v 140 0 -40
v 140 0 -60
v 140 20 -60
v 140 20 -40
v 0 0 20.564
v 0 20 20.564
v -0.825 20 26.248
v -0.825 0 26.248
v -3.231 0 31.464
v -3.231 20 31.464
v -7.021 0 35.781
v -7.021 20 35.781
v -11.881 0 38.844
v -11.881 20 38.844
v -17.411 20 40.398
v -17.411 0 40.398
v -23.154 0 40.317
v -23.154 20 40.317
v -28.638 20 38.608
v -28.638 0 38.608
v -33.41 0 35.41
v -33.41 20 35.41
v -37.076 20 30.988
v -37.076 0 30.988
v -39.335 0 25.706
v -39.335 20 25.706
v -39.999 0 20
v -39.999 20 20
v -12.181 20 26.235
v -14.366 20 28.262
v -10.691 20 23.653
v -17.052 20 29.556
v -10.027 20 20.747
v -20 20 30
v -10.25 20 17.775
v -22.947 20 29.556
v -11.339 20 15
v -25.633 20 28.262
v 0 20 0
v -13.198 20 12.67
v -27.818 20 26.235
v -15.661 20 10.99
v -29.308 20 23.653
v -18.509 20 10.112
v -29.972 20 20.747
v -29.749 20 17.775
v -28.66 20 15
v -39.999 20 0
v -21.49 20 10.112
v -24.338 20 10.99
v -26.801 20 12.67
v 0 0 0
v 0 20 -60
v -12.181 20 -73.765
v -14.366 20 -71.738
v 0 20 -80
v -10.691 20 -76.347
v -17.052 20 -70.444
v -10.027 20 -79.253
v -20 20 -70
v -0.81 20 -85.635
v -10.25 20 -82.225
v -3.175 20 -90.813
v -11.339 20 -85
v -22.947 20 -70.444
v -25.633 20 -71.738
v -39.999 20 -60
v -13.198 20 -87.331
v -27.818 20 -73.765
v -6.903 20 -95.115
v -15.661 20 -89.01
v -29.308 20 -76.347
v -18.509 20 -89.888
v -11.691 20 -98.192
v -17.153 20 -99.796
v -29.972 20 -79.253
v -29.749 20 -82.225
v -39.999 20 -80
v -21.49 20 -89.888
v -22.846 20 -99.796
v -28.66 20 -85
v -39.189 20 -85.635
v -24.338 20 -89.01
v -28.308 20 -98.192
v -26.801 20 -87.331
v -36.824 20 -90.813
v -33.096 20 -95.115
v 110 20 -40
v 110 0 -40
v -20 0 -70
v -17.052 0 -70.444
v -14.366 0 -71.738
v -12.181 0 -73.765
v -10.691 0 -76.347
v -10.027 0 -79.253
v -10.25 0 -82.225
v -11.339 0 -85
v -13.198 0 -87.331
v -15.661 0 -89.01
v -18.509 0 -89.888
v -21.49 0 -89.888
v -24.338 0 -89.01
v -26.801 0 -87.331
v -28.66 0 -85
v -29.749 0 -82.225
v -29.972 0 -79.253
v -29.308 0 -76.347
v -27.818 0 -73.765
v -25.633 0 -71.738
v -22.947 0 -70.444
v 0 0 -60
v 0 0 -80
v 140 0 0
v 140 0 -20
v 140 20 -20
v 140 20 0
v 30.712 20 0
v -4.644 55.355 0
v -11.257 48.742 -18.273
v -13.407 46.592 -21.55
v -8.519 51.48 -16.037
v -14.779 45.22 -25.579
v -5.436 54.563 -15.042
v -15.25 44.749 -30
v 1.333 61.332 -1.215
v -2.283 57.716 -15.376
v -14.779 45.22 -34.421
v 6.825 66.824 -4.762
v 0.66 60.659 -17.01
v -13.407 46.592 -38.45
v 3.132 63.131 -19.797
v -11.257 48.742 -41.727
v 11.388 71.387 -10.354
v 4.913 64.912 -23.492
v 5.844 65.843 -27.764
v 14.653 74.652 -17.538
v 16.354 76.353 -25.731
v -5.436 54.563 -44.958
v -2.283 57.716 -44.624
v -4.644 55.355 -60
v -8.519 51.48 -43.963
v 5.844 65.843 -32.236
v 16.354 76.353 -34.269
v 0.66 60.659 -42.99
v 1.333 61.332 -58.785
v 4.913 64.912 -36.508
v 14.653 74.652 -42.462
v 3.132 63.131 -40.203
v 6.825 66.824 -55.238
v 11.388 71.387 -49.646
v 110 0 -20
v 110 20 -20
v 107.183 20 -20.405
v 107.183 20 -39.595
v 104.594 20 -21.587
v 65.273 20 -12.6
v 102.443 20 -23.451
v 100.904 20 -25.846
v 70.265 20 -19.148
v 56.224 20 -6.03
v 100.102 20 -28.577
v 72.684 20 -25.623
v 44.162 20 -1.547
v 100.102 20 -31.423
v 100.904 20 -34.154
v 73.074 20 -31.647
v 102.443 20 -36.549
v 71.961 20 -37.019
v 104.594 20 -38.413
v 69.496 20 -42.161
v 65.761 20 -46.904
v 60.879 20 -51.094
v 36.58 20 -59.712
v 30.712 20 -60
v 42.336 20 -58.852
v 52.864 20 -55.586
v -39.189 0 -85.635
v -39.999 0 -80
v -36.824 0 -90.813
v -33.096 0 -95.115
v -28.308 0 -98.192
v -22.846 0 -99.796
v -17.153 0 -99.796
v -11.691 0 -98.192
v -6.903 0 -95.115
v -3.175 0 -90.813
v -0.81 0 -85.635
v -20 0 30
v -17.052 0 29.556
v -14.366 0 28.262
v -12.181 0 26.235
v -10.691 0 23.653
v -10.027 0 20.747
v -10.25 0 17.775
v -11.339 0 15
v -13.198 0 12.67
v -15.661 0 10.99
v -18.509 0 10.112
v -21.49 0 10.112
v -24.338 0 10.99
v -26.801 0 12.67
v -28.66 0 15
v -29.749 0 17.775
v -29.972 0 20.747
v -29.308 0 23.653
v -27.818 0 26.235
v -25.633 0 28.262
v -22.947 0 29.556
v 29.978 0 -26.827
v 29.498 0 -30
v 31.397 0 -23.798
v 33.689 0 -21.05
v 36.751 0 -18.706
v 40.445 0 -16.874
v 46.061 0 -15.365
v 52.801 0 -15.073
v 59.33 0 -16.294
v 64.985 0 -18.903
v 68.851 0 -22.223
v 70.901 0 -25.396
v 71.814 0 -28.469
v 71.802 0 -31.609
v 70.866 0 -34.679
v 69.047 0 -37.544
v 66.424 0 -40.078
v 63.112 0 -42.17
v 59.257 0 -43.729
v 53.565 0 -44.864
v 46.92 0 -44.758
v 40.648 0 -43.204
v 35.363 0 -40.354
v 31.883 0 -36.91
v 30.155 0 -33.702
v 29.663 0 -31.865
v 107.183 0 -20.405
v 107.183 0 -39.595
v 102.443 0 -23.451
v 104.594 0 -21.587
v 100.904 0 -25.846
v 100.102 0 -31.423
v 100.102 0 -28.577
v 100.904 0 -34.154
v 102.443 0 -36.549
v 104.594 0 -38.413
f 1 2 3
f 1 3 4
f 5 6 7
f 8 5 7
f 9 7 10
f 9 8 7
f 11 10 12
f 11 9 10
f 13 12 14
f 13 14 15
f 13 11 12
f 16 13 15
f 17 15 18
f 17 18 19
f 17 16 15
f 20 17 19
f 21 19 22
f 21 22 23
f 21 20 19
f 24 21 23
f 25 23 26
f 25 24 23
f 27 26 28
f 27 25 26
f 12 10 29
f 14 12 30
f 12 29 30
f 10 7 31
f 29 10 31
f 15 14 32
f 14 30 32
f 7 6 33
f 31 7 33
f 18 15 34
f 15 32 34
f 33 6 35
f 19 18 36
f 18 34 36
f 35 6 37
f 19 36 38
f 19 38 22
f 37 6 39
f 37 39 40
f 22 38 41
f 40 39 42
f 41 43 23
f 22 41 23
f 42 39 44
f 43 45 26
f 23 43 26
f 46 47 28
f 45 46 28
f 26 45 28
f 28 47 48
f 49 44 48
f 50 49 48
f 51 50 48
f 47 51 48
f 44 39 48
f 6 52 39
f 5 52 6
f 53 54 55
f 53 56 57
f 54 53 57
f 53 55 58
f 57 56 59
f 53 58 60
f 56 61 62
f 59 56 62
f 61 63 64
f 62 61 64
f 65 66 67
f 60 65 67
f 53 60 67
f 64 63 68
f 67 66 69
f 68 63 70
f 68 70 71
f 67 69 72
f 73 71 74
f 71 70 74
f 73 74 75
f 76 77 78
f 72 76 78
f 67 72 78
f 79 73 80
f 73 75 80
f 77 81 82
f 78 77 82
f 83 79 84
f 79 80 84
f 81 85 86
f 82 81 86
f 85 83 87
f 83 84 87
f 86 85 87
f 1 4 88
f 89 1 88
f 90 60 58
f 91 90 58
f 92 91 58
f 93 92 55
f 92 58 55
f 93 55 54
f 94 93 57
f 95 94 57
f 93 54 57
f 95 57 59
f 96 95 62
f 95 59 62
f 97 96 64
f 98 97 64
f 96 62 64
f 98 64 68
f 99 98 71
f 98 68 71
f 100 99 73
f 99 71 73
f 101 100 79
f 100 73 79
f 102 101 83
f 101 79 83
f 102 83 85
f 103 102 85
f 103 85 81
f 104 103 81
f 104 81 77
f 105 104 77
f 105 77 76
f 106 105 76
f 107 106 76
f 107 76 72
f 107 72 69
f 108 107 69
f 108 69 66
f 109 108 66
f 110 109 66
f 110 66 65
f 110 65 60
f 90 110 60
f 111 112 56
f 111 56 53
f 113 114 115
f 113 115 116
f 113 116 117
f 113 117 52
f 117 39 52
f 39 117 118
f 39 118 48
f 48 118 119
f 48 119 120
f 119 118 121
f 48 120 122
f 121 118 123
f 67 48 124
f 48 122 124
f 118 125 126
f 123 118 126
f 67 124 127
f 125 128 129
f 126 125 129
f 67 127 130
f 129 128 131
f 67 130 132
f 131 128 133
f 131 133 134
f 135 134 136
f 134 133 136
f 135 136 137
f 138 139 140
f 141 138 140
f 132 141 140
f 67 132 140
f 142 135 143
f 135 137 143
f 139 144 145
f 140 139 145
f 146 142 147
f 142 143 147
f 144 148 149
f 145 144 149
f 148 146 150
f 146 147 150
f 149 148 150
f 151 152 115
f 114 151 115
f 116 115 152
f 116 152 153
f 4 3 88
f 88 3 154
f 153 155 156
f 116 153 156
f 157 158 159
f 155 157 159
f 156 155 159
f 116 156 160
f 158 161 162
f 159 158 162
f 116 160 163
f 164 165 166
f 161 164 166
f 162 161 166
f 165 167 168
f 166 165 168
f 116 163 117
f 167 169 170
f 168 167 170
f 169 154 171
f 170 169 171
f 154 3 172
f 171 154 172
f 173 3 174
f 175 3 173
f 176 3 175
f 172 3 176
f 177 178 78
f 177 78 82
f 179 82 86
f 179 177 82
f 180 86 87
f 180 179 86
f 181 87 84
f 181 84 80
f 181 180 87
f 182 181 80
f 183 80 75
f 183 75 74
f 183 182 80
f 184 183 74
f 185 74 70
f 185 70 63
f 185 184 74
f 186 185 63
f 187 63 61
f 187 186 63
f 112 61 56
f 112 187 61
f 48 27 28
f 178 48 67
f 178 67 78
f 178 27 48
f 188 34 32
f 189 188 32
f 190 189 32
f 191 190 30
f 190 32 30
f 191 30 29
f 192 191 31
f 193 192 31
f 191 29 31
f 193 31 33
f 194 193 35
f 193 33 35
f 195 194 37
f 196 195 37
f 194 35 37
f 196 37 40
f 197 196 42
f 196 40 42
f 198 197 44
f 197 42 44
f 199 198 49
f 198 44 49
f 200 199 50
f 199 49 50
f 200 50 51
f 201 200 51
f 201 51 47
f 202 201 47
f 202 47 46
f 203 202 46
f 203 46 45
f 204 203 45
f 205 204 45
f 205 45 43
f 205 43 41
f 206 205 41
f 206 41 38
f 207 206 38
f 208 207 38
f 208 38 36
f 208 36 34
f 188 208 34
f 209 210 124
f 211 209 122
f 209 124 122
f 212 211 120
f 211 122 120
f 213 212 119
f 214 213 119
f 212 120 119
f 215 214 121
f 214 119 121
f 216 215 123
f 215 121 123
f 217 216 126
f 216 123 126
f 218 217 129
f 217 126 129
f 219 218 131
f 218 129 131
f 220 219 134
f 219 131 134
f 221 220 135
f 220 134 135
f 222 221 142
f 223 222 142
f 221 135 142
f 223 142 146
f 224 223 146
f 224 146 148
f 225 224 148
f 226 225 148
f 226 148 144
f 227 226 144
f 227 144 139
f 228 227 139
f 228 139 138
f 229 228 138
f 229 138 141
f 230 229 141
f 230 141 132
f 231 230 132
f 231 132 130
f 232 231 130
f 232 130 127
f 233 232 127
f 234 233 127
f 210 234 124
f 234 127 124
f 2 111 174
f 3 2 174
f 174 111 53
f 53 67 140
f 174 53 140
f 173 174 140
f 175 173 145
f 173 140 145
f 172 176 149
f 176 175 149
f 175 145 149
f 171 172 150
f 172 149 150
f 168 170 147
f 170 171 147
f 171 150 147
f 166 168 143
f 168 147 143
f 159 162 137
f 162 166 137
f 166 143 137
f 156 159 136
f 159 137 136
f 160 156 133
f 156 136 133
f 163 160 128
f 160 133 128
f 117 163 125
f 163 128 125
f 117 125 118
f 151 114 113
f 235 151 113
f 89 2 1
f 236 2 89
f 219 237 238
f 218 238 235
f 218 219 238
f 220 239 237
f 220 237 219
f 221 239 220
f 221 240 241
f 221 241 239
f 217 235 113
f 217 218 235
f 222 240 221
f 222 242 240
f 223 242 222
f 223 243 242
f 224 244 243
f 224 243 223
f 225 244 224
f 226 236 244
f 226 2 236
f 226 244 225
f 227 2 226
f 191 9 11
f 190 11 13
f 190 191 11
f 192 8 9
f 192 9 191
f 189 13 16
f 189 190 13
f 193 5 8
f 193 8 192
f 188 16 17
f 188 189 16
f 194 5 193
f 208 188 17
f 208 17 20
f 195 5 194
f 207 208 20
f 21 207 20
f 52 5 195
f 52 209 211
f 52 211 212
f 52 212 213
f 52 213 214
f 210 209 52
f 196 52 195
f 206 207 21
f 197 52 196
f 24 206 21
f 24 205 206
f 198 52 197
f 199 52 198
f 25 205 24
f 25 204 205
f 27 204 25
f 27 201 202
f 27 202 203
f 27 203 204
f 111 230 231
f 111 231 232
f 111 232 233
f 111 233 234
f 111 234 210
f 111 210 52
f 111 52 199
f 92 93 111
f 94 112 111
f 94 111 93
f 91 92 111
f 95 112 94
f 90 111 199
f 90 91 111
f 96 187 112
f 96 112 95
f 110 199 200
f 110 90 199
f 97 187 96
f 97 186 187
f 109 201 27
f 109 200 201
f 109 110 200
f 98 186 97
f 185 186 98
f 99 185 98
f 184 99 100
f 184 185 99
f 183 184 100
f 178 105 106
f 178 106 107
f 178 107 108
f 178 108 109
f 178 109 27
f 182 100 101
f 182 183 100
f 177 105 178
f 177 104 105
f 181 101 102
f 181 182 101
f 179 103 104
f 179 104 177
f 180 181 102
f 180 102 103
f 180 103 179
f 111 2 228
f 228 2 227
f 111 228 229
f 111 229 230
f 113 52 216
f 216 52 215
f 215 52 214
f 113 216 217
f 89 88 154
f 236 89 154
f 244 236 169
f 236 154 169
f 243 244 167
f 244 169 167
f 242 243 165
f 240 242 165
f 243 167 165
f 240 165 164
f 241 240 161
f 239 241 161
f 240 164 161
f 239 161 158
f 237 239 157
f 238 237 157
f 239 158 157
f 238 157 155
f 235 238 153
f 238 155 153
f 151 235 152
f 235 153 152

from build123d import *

# Parameters (mm, degrees)
BOSS_EXTRUDE2_DEPTH = 20
SKETCH2_R           = 10
CUT_EXTRUDE1_DEPTH  = 174.204794268
BOSS_EXTRUDE3_REACH = 201.499
CUT_EXTRUDE3_REACH  = 204.653
SKETCH5_R           = 15
CUT_EXTRUDE4_DEPTH  = 182.107428775


with BuildPart() as part:
    # Sketch1 → Boss-Extrude2 (new body)
    with BuildSketch(Plane(origin=(0, 0, 0), x_dir=(1, 0, 0), z_dir=(0, 1, 0))):
        with BuildLine():
            Line((0, 60), (140, 60))
            Line((140, 60), (140, 0))
            Line((140, 0), (0, 0))
            Line((0, 0), (0, -20.563630546))
            ThreePointArc((0, -20.563630546), (-20.285292958, -40.565119434), (-39.999007572, -20.000048944))
            Line((-39.999007572, -20.000048944), (-39.999007572, 80))
            ThreePointArc((-39.999007572, 80), (-19.999503786, 99.999503786), (0, 80))
            Line((0, 80), (0, 60))
        make_face()
    extrude(amount=BOSS_EXTRUDE2_DEPTH)

    # Sketch2 → Cut-Extrude1 (cut, through all)
    with BuildSketch(Plane(origin=(0, 20, 0), x_dir=(1, 0, 0), z_dir=(0, 1, 0))):
        with Locations(Location((-19.999503786, 80, 0), (0, 0, 270))):
            Circle(SKETCH2_R)
        with Locations(Location((-19.999503786, -20.000048944, 0), (0, 0, 270))):
            Circle(SKETCH2_R)
    extrude(amount=-CUT_EXTRUDE1_DEPTH, mode=Mode.SUBTRACT)

    # Boss-Extrude3: up to this face of the body (flat: up to its plane)
    boss_extrude3_end = Plane(part.part.faces().sort_by_distance((37.926780592, 20, -29.884787344))[0])
    # Sketch4 → Boss-Extrude3 (add, up to the picked face)
    with BuildSketch(Plane(origin=(-29.999503786, 29.999503786, 0), x_dir=(0, 0, 1), z_dir=(-0.7071067811865488, 0.7071067811865464, 0)), mode=Mode.PRIVATE) as boss_extrude3_sk1:
        with BuildLine():
            Line((-60, -14.141433871), (-60, 35.858566129))
            ThreePointArc((-60, 35.858566129), (-30, 65.858566129), (0, 35.858566129))
            Line((0, 35.858566129), (0, -14.141433871))
            Line((0, -14.141433871), (-60, -14.141433871))
        make_face()
    boss_extrude3_tool1 = split(extrude(boss_extrude3_sk1.sketch, amount=-BOSS_EXTRUDE3_REACH, mode=Mode.PRIVATE), bisect_by=boss_extrude3_end, keep=Keep.BOTH, mode=Mode.PRIVATE)
    add(boss_extrude3_tool1.solids().sort_by(Axis((-13.775448, 46.22356, -30), (0.7071067811865488, -0.7071067811865464, 0)))[0])

    # Cut-Extrude3: up to this plane
    cut_extrude3_end = Plane(origin=(-20.003474187, 0, 20.563630546), z_dir=(0, 1, 0))
    # Sketch5 → Cut-Extrude3 (cut, up to the surface)
    with BuildSketch(Plane(origin=(-29.999503786, 29.999503786, 0), x_dir=(0, 0, 1), z_dir=(-0.7071067811865487, 0.7071067811865465, 0)), mode=Mode.PRIVATE) as cut_extrude3_sk1:
        with Locations(Location((-30, 35.858566129, 0), (0, 0, 270))):
            Circle(SKETCH5_R)
    cut_extrude3_tool1 = split(extrude(cut_extrude3_sk1.sketch, amount=-CUT_EXTRUDE3_REACH, mode=Mode.PRIVATE), bisect_by=cut_extrude3_end, keep=Keep.BOTH, mode=Mode.PRIVATE)
    add(cut_extrude3_tool1.solids().sort_by_distance((-4.643669, 55.355339, -30))[0], mode=Mode.SUBTRACT)

    # Sketch6 → Cut-Extrude4 (cut, through all)
    with BuildSketch(Plane(origin=(0, 20, 0), x_dir=(1, 0, 0), z_dir=(0, 1, 0))):
        with BuildLine():
            Line((140, 40), (110, 40))
            ThreePointArc((110, 40), (100, 30), (110, 20))
            Line((110, 20), (140, 20))
            Line((140, 20), (140, 40))
        make_face()
    extrude(amount=-CUT_EXTRUDE4_DEPTH, mode=Mode.SUBTRACT)


solid = part.part
